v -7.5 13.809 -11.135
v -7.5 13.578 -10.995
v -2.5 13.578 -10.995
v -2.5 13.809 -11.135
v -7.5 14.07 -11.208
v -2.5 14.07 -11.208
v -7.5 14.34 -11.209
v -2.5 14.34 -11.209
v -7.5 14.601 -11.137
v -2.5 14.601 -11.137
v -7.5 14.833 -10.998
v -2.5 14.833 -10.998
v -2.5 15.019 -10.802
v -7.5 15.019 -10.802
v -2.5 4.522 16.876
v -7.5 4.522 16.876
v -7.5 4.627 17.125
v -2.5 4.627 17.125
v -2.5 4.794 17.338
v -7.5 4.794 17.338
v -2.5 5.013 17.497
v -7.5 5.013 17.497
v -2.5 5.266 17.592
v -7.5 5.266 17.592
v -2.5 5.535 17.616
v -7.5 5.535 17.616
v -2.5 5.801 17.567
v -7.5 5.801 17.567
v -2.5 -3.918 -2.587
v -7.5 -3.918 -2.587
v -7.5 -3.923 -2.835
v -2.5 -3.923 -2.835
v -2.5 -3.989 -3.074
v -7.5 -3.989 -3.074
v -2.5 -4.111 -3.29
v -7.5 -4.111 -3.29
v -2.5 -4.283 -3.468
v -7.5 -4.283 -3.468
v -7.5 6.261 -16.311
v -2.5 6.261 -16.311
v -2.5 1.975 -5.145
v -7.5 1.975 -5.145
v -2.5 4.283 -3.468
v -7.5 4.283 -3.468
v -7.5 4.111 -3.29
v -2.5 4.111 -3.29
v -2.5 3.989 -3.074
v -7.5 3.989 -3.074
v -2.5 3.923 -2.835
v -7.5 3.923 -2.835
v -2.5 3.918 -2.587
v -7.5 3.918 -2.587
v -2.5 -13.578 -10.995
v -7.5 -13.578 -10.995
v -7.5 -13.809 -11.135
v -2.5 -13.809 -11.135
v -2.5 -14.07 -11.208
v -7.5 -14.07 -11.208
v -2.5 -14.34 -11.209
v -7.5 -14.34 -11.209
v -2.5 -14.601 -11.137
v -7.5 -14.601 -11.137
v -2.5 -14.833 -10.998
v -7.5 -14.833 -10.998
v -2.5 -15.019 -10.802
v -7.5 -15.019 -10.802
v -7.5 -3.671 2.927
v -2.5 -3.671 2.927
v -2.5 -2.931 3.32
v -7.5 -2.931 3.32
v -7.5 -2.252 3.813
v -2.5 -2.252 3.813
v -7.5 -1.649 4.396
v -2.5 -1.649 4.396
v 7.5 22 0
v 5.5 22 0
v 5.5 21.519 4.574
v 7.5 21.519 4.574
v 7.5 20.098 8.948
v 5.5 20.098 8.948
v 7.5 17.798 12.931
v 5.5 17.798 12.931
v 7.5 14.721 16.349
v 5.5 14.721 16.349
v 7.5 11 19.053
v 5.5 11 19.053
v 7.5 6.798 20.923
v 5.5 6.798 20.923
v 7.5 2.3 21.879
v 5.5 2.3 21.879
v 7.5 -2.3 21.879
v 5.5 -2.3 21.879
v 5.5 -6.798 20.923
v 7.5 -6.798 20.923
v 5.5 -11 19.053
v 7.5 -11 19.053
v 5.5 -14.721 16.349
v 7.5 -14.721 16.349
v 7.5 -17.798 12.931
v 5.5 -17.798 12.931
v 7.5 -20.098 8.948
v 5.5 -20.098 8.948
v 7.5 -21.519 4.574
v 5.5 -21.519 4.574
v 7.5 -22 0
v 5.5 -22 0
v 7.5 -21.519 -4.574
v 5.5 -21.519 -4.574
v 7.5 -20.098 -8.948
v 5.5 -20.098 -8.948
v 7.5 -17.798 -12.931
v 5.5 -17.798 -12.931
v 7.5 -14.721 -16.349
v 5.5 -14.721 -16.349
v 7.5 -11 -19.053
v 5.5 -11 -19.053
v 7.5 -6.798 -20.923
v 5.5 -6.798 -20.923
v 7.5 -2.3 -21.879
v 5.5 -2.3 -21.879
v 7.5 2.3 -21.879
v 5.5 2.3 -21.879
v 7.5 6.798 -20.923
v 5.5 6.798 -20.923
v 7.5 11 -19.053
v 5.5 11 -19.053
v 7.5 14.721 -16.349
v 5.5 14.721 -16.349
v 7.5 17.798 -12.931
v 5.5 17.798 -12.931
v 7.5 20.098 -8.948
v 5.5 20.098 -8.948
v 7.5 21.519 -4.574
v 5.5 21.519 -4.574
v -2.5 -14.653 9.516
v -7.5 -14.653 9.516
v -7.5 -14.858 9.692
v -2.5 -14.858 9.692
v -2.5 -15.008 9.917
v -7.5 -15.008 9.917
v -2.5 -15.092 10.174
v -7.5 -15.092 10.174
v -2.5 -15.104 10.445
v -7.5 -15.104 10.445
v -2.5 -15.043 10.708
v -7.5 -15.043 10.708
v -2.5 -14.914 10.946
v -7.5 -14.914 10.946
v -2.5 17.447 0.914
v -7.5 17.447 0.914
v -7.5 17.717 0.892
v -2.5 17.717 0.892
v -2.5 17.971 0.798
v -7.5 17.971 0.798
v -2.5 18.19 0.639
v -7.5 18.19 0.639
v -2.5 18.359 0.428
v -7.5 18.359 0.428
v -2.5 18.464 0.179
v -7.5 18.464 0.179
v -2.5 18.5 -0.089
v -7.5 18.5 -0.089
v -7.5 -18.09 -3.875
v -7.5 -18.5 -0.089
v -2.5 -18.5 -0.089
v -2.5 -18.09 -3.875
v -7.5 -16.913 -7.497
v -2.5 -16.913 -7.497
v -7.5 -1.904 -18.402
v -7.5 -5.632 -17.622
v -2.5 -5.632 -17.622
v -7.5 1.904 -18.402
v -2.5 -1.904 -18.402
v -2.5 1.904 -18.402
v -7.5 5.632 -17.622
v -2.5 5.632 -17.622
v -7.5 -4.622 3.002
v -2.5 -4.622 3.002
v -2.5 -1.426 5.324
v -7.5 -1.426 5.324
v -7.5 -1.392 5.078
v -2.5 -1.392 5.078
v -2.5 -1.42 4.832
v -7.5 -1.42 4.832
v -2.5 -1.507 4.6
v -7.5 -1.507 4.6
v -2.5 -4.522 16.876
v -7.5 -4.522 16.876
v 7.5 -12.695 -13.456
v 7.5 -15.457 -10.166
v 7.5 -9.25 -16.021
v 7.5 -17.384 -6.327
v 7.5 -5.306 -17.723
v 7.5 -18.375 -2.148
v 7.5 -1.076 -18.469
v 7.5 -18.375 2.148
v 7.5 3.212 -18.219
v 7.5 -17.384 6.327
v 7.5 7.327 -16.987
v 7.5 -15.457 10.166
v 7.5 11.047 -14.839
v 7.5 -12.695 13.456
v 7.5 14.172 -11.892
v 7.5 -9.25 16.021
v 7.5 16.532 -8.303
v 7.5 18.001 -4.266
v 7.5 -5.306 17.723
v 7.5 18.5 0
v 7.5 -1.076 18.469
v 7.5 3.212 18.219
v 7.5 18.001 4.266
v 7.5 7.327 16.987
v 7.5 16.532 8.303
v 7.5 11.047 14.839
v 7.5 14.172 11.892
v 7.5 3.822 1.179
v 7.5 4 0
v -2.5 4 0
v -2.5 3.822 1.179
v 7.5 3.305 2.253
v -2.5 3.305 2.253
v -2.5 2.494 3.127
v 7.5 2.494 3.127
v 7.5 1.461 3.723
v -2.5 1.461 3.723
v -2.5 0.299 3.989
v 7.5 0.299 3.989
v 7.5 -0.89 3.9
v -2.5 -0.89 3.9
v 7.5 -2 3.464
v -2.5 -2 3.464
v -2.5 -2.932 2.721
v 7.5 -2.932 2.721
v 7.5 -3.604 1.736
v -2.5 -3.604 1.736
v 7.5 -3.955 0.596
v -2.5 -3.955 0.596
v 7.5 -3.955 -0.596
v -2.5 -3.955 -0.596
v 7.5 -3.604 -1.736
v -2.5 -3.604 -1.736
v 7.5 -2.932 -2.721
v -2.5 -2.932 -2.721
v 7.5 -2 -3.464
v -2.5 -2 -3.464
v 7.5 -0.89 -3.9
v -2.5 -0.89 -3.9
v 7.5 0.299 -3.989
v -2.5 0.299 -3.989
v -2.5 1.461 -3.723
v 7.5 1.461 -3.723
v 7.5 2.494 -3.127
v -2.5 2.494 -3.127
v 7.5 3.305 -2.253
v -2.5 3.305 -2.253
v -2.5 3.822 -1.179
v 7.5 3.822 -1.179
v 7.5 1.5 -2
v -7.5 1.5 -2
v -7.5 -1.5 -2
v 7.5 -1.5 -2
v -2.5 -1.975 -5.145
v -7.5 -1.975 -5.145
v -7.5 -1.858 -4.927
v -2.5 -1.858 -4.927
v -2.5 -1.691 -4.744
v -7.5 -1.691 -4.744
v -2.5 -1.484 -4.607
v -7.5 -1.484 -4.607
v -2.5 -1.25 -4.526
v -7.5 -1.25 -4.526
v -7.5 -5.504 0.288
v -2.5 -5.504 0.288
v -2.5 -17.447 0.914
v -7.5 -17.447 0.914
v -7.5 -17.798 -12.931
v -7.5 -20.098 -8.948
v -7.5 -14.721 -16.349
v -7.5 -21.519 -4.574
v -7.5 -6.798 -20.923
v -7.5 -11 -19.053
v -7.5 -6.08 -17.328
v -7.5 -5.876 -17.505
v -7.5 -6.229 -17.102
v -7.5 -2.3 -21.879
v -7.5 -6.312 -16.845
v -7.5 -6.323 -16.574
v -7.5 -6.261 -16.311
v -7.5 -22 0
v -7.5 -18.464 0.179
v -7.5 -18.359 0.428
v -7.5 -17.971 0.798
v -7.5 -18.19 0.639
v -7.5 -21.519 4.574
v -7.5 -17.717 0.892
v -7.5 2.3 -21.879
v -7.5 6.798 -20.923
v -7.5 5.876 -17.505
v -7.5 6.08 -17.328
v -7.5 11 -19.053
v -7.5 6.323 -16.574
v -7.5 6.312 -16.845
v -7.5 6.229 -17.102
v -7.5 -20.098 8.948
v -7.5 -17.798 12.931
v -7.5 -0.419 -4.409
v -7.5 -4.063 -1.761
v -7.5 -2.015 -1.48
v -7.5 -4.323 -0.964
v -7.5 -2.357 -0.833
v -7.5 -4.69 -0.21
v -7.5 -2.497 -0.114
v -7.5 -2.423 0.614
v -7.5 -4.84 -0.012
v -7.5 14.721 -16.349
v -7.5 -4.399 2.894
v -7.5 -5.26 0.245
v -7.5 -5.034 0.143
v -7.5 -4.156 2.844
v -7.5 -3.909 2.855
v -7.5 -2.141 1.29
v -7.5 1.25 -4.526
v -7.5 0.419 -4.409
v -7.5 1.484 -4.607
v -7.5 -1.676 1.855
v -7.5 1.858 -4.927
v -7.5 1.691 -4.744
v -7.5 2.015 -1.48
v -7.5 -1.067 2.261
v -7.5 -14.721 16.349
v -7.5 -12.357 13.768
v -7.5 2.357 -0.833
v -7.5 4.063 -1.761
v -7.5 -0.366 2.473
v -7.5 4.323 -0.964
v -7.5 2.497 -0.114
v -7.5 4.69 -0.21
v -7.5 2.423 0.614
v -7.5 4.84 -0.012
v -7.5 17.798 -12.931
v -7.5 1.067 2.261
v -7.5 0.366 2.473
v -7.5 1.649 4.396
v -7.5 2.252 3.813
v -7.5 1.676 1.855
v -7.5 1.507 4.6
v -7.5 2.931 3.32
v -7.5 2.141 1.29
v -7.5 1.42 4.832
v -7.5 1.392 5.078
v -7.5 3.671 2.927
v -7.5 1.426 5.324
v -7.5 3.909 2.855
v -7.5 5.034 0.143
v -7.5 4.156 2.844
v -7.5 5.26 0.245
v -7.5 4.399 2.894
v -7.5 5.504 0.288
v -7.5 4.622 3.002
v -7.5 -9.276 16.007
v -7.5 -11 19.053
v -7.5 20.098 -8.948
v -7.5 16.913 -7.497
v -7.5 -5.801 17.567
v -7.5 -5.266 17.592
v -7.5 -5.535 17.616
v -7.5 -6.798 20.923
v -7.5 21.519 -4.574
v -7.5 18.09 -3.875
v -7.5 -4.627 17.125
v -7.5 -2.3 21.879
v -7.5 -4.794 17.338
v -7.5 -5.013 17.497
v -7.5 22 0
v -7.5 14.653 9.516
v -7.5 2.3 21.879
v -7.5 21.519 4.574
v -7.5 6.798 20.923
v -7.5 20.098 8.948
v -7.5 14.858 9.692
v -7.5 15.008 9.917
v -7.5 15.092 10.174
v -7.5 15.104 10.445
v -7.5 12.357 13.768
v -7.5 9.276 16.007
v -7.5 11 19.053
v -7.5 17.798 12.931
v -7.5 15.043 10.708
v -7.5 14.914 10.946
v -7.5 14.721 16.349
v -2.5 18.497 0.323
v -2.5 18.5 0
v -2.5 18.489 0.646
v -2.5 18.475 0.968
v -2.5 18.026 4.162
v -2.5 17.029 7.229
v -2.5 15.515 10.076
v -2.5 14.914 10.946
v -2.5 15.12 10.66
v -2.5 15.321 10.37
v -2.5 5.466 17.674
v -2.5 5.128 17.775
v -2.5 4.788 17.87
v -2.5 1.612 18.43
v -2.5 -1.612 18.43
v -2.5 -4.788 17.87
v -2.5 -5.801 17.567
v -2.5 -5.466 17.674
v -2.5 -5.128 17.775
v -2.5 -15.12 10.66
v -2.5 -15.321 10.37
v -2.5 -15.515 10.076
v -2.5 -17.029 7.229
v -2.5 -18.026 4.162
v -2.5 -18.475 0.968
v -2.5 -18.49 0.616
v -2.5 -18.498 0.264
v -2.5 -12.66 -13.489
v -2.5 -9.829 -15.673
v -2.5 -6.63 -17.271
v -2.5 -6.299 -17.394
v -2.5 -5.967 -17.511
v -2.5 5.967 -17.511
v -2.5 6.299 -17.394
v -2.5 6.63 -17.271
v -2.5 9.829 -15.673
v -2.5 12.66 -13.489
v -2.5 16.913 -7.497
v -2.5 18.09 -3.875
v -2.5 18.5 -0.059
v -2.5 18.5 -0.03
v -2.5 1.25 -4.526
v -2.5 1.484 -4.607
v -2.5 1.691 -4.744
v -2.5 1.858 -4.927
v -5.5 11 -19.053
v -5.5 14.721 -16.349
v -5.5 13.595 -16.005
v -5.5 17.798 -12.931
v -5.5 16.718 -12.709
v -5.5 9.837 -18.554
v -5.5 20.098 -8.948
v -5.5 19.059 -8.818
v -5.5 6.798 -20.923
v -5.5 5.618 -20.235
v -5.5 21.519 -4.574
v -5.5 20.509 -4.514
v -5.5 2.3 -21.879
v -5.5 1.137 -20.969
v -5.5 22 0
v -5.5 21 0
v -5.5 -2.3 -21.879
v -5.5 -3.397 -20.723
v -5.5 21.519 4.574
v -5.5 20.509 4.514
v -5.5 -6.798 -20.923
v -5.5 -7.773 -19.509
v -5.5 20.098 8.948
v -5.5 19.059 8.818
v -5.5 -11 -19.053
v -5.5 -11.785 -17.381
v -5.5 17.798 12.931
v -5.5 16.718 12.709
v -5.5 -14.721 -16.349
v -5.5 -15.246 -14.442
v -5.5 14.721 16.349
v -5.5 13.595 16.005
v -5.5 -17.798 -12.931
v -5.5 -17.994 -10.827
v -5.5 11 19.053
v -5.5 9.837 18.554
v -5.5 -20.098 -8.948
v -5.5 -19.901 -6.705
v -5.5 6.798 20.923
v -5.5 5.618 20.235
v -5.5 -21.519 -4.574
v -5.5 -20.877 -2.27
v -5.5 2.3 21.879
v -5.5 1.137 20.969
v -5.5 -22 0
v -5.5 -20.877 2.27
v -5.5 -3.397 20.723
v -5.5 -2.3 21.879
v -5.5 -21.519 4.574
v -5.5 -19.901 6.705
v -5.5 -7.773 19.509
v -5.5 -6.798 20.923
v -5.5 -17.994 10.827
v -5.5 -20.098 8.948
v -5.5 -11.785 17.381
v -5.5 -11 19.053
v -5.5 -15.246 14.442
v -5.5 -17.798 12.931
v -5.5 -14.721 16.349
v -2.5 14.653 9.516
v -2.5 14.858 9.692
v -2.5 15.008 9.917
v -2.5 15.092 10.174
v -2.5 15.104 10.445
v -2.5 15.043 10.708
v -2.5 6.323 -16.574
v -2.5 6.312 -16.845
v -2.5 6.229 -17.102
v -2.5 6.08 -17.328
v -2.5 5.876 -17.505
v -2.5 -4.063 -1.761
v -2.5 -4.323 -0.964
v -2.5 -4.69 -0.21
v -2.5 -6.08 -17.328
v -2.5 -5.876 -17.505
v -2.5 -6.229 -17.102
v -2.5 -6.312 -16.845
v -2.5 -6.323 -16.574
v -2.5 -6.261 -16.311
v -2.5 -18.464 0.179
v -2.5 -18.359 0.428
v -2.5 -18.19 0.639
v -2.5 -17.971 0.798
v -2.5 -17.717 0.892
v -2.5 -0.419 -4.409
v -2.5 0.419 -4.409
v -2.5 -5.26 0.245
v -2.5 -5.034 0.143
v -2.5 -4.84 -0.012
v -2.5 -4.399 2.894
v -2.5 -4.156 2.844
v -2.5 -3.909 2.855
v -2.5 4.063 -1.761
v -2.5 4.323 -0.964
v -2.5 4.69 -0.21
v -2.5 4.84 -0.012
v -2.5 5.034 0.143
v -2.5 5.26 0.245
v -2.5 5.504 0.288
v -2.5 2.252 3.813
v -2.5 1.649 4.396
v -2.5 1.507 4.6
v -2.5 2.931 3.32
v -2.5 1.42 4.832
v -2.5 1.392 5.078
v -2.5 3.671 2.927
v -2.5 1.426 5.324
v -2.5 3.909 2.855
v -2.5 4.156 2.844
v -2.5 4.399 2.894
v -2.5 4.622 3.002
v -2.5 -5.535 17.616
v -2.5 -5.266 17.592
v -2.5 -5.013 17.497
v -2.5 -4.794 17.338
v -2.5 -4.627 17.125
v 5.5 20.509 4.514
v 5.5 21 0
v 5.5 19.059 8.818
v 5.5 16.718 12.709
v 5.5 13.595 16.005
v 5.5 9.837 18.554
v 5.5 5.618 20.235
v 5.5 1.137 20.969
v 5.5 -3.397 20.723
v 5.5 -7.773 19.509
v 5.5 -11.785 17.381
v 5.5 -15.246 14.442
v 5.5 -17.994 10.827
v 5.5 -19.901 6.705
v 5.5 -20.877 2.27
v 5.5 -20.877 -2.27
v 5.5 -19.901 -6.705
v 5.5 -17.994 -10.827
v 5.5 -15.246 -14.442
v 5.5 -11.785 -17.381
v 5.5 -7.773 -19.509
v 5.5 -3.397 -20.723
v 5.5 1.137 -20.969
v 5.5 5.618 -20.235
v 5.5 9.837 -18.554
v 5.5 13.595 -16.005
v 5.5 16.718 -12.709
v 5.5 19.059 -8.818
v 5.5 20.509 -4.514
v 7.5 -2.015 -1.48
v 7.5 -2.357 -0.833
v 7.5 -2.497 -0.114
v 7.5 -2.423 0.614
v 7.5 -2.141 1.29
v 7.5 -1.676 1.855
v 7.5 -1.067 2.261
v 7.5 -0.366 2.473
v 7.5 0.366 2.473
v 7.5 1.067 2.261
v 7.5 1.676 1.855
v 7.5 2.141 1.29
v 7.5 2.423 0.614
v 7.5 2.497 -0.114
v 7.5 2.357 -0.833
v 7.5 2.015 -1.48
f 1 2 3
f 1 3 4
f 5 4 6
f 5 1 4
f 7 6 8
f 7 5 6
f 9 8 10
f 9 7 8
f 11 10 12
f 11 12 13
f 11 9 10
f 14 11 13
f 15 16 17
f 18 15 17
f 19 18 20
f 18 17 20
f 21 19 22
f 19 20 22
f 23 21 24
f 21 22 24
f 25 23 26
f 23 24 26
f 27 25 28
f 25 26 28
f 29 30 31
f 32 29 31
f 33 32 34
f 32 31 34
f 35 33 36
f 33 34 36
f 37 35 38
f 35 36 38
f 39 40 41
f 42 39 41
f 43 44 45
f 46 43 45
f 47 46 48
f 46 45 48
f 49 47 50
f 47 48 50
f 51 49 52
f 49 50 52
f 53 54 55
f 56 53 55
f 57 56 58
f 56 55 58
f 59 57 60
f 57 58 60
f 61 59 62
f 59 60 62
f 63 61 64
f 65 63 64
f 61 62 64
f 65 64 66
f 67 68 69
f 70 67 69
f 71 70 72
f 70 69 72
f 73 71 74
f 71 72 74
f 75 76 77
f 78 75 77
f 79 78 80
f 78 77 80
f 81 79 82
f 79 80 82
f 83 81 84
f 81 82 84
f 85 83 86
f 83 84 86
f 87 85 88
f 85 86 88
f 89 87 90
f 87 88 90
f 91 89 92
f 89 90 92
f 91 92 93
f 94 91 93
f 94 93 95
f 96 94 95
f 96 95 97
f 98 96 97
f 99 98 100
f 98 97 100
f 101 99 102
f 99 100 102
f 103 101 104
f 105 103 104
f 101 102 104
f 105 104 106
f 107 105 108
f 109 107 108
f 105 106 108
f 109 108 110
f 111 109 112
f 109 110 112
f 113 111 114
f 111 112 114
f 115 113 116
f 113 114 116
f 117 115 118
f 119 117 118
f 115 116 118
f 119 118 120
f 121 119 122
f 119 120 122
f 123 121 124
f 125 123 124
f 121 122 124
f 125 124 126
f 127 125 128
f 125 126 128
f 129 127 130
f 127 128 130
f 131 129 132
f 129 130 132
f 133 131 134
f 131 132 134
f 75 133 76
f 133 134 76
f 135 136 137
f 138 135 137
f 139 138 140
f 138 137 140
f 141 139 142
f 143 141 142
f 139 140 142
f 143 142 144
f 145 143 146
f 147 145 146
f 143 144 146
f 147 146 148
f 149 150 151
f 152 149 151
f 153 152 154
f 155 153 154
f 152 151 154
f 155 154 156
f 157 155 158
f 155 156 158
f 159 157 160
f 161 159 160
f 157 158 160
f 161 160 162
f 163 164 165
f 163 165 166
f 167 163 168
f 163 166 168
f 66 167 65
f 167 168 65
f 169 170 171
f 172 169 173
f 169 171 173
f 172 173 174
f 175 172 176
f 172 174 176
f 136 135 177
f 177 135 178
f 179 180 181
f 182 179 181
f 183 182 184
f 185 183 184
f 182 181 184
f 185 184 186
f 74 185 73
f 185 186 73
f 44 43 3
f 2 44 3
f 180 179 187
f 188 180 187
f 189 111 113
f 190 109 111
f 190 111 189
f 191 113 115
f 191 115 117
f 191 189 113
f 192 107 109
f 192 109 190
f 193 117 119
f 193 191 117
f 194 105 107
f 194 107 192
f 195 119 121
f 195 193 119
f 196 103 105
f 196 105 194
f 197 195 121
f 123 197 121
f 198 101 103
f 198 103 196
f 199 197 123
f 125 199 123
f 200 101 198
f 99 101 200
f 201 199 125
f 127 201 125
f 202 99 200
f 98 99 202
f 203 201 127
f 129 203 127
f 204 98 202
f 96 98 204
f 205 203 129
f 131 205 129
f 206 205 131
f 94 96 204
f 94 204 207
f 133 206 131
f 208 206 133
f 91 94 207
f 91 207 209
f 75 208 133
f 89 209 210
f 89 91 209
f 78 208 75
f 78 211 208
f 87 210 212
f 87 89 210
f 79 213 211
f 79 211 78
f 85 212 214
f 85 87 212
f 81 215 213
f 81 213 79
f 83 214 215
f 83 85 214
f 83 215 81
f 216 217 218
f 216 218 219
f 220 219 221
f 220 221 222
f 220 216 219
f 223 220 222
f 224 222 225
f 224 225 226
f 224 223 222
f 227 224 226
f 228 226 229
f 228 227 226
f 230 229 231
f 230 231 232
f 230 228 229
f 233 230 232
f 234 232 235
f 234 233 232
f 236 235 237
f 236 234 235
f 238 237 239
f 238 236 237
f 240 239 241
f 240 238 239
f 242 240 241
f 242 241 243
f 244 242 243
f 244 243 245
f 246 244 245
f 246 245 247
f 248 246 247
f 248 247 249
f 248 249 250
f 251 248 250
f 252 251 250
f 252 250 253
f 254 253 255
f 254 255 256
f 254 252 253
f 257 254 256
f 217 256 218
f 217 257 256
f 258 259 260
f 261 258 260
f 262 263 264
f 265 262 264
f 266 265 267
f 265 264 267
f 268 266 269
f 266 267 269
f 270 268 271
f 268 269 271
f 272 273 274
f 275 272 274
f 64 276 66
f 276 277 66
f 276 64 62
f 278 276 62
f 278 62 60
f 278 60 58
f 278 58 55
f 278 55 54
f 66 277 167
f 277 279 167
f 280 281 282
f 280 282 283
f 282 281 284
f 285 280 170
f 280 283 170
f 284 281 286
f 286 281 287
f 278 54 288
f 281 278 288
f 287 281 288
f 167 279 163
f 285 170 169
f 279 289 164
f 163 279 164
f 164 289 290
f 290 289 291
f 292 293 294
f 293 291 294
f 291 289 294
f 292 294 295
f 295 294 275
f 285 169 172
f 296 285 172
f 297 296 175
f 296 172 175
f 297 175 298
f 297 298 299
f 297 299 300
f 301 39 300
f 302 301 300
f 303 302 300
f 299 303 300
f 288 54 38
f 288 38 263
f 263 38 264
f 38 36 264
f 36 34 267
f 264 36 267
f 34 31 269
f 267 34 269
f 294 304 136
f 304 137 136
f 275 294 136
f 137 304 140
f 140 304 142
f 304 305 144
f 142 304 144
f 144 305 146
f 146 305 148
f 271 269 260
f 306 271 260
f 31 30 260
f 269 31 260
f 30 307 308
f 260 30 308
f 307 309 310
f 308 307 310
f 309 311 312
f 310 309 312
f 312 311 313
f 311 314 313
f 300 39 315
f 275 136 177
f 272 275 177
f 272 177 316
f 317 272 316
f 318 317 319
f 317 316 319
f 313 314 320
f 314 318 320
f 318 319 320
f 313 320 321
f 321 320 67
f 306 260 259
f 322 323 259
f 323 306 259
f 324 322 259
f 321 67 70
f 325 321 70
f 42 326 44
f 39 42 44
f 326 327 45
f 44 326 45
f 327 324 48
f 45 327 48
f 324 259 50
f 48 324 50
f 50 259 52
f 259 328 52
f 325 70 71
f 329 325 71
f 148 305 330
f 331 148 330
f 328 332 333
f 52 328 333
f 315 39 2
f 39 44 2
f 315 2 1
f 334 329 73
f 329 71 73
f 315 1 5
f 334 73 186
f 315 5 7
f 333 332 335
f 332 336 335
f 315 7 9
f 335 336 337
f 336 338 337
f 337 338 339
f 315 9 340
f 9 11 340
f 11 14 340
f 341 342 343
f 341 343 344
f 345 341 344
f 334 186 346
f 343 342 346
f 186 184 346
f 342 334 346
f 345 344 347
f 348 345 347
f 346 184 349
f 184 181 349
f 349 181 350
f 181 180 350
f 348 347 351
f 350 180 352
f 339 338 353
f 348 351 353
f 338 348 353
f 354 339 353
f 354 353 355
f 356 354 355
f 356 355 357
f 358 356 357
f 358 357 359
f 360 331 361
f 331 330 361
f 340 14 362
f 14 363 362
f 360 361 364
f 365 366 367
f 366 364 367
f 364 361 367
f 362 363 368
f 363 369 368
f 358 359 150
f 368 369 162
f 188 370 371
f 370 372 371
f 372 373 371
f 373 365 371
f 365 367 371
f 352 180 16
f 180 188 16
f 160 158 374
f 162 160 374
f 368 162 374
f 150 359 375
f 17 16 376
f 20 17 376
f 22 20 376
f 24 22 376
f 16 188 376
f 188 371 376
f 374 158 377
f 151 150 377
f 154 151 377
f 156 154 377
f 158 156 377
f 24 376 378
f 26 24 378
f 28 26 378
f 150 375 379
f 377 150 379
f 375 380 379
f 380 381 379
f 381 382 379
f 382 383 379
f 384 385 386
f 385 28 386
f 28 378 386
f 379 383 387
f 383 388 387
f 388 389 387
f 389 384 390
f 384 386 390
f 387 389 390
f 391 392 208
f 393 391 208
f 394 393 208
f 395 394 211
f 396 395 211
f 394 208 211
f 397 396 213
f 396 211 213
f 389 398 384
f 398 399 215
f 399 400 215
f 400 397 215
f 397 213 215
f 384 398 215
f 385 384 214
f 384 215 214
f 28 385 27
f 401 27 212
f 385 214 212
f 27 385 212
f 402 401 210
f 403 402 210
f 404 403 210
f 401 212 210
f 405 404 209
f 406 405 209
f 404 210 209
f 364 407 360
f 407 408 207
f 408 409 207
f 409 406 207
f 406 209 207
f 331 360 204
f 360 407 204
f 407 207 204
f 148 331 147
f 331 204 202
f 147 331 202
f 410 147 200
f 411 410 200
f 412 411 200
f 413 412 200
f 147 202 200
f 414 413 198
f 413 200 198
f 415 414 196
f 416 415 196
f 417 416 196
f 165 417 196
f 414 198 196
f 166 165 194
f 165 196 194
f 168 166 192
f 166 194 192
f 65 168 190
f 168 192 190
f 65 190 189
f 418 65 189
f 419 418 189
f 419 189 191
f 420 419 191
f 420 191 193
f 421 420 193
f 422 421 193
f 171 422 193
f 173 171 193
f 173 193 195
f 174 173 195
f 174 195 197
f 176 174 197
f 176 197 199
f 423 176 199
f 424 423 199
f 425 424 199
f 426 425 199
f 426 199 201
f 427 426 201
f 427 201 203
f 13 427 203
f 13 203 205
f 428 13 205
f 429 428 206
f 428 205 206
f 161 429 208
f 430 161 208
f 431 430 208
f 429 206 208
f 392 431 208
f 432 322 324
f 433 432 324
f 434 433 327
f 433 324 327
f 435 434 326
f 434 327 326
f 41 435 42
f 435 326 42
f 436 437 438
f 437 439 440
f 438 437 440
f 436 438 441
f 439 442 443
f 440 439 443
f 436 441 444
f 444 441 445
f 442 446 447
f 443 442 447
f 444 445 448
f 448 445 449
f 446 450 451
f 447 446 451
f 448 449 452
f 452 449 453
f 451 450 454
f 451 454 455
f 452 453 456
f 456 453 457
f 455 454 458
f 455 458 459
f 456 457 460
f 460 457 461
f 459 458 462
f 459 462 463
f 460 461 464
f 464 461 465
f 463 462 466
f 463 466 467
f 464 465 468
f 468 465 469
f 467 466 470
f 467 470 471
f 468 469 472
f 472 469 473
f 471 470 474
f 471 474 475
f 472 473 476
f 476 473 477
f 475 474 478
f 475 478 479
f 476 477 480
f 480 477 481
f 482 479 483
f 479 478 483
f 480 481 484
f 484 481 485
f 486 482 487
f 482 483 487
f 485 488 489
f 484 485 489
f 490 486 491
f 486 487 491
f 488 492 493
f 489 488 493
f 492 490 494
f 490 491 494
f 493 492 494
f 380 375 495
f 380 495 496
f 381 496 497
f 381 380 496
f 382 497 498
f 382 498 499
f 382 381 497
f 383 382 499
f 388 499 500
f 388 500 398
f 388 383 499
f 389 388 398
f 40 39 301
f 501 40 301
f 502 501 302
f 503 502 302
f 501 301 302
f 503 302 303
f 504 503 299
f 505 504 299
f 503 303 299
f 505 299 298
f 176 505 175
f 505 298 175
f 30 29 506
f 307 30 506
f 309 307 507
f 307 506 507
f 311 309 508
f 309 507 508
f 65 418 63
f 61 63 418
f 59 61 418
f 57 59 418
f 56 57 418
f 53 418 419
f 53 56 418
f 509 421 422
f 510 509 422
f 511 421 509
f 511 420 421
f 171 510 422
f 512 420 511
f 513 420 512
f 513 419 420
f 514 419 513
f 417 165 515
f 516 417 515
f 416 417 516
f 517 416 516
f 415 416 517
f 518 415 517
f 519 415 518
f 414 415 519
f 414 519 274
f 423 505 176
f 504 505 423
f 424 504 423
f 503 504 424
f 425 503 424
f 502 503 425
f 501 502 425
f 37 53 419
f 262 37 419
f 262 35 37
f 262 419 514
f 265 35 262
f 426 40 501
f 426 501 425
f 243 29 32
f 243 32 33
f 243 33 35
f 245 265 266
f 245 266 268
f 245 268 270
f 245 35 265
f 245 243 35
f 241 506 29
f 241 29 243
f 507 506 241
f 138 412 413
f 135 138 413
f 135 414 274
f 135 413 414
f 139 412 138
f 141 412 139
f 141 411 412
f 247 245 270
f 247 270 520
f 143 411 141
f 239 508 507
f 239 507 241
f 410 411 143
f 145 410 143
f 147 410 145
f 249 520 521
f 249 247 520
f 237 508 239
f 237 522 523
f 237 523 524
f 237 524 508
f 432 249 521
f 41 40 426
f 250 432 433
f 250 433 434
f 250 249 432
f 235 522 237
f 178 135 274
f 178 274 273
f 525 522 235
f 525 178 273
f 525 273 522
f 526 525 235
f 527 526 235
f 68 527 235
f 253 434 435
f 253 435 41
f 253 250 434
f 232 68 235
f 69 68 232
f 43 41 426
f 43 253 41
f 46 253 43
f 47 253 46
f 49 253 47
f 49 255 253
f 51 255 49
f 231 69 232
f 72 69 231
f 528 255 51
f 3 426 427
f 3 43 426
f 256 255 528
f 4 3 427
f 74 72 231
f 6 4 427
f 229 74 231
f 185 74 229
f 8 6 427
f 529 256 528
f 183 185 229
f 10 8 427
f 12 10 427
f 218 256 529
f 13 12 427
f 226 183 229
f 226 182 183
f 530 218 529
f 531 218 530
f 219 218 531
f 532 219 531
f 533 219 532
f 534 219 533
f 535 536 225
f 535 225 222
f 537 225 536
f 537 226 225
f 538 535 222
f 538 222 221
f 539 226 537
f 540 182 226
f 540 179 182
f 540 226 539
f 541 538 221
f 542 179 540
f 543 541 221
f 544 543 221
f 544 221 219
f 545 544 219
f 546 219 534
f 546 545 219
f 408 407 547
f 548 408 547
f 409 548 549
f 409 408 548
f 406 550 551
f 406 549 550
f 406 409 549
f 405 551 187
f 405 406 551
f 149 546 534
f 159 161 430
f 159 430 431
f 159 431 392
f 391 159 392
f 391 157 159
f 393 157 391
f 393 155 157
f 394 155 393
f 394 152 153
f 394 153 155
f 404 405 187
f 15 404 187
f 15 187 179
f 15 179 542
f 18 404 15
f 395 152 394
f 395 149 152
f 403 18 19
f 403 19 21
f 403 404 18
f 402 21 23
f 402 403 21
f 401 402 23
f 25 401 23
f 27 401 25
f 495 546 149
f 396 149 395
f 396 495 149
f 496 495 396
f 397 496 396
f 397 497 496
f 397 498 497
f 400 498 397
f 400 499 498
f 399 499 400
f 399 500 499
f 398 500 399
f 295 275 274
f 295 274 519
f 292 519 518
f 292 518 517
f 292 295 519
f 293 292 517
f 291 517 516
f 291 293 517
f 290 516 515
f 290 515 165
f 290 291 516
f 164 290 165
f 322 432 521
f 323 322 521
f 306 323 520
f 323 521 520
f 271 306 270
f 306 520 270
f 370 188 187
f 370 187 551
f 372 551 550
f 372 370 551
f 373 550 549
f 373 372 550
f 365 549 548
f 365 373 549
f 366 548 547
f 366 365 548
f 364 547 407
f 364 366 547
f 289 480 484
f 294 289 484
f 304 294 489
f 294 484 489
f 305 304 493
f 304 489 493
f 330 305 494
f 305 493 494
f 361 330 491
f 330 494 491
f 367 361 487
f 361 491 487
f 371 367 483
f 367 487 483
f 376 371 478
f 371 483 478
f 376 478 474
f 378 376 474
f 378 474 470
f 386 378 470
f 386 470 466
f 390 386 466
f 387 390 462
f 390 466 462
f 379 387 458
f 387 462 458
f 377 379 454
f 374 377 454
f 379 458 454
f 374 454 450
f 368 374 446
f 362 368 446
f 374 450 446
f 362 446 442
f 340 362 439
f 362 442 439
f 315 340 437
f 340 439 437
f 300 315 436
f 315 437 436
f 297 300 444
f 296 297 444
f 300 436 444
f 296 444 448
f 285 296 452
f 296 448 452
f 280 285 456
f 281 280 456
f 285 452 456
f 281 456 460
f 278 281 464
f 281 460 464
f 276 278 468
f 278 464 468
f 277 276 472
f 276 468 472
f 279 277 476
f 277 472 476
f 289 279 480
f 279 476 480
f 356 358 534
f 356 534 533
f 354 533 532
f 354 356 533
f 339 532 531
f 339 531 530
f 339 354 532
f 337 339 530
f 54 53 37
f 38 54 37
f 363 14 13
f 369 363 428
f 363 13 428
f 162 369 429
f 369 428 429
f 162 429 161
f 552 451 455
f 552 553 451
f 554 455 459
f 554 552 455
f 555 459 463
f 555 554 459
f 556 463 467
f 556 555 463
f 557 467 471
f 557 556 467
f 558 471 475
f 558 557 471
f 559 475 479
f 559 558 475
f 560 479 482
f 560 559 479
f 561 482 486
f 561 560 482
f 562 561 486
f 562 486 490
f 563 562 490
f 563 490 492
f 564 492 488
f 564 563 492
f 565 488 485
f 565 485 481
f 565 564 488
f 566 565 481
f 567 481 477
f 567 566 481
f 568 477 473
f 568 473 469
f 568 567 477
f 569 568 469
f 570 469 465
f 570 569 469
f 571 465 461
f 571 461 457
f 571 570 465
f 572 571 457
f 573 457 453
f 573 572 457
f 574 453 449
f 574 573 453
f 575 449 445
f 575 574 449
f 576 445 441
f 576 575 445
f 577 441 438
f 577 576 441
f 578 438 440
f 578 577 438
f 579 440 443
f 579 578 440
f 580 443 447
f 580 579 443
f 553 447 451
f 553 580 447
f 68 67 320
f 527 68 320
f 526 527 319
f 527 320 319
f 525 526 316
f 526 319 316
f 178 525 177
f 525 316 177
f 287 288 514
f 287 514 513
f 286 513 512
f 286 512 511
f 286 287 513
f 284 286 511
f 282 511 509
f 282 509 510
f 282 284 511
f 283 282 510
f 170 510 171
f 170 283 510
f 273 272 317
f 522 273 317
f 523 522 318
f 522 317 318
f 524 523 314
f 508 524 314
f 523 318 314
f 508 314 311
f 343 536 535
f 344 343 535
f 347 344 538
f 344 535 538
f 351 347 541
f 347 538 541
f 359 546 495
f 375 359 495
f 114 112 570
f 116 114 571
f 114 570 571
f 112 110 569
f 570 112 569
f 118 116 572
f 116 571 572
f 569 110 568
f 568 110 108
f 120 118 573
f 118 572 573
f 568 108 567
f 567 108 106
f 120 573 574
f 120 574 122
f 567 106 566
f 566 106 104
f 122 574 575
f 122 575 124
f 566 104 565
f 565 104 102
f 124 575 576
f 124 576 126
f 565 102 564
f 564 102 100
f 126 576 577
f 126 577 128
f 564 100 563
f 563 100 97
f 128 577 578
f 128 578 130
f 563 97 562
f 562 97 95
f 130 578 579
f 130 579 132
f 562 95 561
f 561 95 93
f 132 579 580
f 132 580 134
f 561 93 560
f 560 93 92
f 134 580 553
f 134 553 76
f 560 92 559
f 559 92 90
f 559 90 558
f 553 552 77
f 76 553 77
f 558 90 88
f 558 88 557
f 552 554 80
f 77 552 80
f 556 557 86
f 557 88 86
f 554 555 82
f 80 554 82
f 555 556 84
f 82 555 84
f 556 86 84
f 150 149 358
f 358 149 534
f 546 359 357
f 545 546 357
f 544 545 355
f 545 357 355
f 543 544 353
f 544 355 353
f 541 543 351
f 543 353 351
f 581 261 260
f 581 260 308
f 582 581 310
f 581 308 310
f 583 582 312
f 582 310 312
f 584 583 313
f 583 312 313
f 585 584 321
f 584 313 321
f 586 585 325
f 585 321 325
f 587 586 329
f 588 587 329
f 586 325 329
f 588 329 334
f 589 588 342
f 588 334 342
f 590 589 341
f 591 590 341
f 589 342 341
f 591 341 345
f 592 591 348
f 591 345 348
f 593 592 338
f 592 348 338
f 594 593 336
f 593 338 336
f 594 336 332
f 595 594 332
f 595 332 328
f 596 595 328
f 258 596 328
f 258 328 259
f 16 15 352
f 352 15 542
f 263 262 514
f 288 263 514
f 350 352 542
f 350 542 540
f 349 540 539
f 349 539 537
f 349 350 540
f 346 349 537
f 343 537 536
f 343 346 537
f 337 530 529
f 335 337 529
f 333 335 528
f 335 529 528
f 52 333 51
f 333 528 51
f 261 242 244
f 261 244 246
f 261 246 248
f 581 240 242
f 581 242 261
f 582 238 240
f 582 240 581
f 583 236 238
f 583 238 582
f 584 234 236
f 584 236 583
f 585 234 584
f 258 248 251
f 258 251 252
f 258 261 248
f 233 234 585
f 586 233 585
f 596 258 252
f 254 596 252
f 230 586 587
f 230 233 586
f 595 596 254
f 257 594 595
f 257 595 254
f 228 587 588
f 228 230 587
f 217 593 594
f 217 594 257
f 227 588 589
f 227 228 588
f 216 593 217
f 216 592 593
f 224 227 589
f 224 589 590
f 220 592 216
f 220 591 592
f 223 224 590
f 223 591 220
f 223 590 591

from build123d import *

# Parameters (mm, degrees)
F0_R         = 21
F1_DEPTH     = 5.5
F2_R         = 22
F3_DEPTH     = 2
F4_R         = 22
F5_DEPTH     = 2
F7_DEPTH     = 15.001
F8_R         = 18.5
F8_R_2       = 4
F9_DEPTH     = 10
F11_DEPTH    = 5.001
F12_T1_DEPTH = 5


# Not quite as in the source:
# - a fillet or chamfer that OpenCascade refuses, or shapes differently, is made with other operations: its cross-section is extruded or revolved along the edge and cut away or added


with BuildPart() as f1:
    # F0 (on Right) → F1 (new body, symmetric)
    with BuildSketch(Plane.YZ):
        Circle(F0_R)
    extrude(amount=F1_DEPTH, both=True)

    # F2 (on face) → F3 (join)
    with BuildSketch(Plane.YZ.offset(5.5)):
        Circle(F2_R)
    extrude(amount=F3_DEPTH)

    # F4 (on face) → F5 (join)
    with BuildSketch(Plane(origin=(-5.5, 0, 0), x_dir=(0, -1, 0), z_dir=(-1, 0, 0))):
        Circle(F4_R)
    extrude(amount=F5_DEPTH)

    # F6 (on face) → F7 (cut, through all)
    with BuildSketch(Plane(origin=(-7.5, 0, 0), x_dir=(0, -1, 0), z_dir=(-1, 0, 0))):
        with BuildLine():
            Line((-1.5, -2), (1.5, -2))
            ThreePointArc((1.5, -2), (0, 2.5), (-1.5, -2))
        make_face()
    extrude(amount=-F7_DEPTH, mode=Mode.SUBTRACT)

    # F8 (on face) → F9 (cut)
    with BuildSketch(Plane.YZ.offset(7.5)):
        Circle(F8_R)
        Circle(F8_R_2, mode=Mode.SUBTRACT)
    extrude(amount=-F9_DEPTH, mode=Mode.SUBTRACT)

    # F10 (on face) → F11 (cut, through all)
    with BuildSketch(Plane.YZ.offset(-2.5)):
        with BuildLine():
            Line((4.7881523344, 17.8696277863), (1.2940952255, 4.8296291314))
            ThreePointArc((1.2940952255, 4.8296291314), (2.5827855501, 3.5548993357), (4.1933528397, 2.7231951751))
            Line((4.1933528397, 2.7231951751), (15.515405507, 10.0758221478))
            ThreePointArc((15.515405507, 10.0758221478), (10.8740271674, 14.9668143959), (4.7881523344, 17.8696277863))
        make_face()
        with BuildLine():
            ThreePointArc((4.9931476738, 0.2616797812), (4.1790348058, -1.3578507196), (3.8857298073, -3.1466019552))
            Line((3.8857298073, -3.1466019552), (14.377200287, -11.6424272344))
            ThreePointArc((14.377200287, -11.6424272344), (17.5945455515, -5.7168143959), (18.474646393, 0.9682151905))
            Line((18.474646393, 0.9682151905), (4.9931476738, 0.2616797812))
        make_face()
        with BuildLine():
            ThreePointArc((1.7918397477, -4.6679021325), (0, -4.3940972321), (-1.7918397477, -4.6679021325))
            Line((-1.7918397477, -4.6679021325), (-6.6298070666, -17.2712378902))
            ThreePointArc((-6.6298070666, -17.2712378902), (0, -18.5), (6.6298070666, -17.2712378902))
            Line((6.6298070666, -17.2712378902), (1.7918397477, -4.6679021325))
        make_face()
        with BuildLine():
            ThreePointArc((-3.8857298073, -3.1466019552), (-4.1790348058, -1.3578507196), (-4.9931476738, 0.2616797812))
            Line((-4.9931476738, 0.2616797812), (-18.474646393, 0.9682151905))
            ThreePointArc((-18.474646393, 0.9682151905), (-17.5945455515, -5.7168143959), (-14.377200287, -11.6424272344))
            Line((-14.377200287, -11.6424272344), (-3.8857298073, -3.1466019552))
        make_face()
        with BuildLine():
            ThreePointArc((-4.1933528397, 2.7231951751), (-2.5827855501, 3.5548993357), (-1.2940952255, 4.8296291314))
            Line((-1.2940952255, 4.8296291314), (-4.7881523344, 17.8696277863))
            ThreePointArc((-4.7881523344, 17.8696277863), (-10.8740271674, 14.9668143959), (-15.515405507, 10.0758221478))
            Line((-15.515405507, 10.0758221478), (-4.1933528397, 2.7231951751))
        make_face()
    extrude(amount=-F11_DEPTH, mode=Mode.SUBTRACT)

    # F12: fillet of radius 1 on 20 edges, made by hand

    # F12_s2 → F12_t1 (join)
    with BuildSketch(Plane.YZ.offset(-7.5)):
        with BuildLine():
            ThreePointArc((4.6223226532, 3.0017714292), (4.1563467345, 2.8435407412), (3.671320929, 2.9267301361))
            ThreePointArc((3.671320929, 2.9267301361), (3.9299597122, 2.8188656209), (4.1933528397, 2.7231951751))
            Line((4.1933528397, 2.7231951751), (4.6223226532, 3.0017714292))
        make_face()
        with BuildLine():
            ThreePointArc((1.4264780248, 5.3236884645), (1.4199861758, 4.831623059), (1.6489852086, 4.3960430429))
            ThreePointArc((1.6489852086, 4.3960430429), (1.466476179, 4.6086911748), (1.2940952255, 4.8296291314))
            Line((1.2940952255, 4.8296291314), (1.4264780248, 5.3236884645))
        make_face()
        with BuildLine():
            ThreePointArc((14.65275333, 9.5156092737), (15.0918050058, 10.1744115971), (14.9142922547, 10.9459529755))
            ThreePointArc((14.9142922547, 10.9459529755), (15.221067912, 10.5151838604), (15.515405507, 10.0758221478))
            Line((15.515405507, 10.0758221478), (14.65275333, 9.5156092737))
        make_face()
        with BuildLine():
            ThreePointArc((4.521932413, 16.8760815136), (5.0128162263, 17.4972255847), (5.8014501386, 17.5668203238))
            ThreePointArc((5.8014501386, 17.5668203238), (5.2969654732, 17.7254663345), (4.7881523344, 17.8696277863))
            Line((4.7881523344, 17.8696277863), (4.521932413, 16.8760815136))
        make_face()
        with BuildLine():
            ThreePointArc((5.5039345567, 0.2884489874), (5.0339464546, 0.1425665301), (4.6904498348, -0.2098261196))
            ThreePointArc((4.6904498348, -0.2098261196), (4.8362918345, 0.0294621688), (4.9931476738, 0.2616797812))
            Line((4.9931476738, 0.2616797812), (5.5039345567, 0.2884489874))
        make_face()
        with BuildLine():
            ThreePointArc((4.2832305314, -3.4684916949), (3.9887497267, -3.0742182326), (3.9179863263, -2.5872243429))
            ThreePointArc((3.9179863263, -2.5872243429), (3.8953248556, -2.8665364113), (3.8857298073, -3.1466019552))
            Line((3.8857298073, -3.1466019552), (4.2832305314, -3.4684916949))
        make_face()
        with BuildLine():
            ThreePointArc((1.2498722119, -4.5257227166), (1.6911638308, -4.7435120977), (1.9751406031, -5.1454171863))
            Line((1.9751406031, -5.1454171863), (1.7918397477, -4.6679021325))
            ThreePointArc((1.7918397477, -4.6679021325), (1.5225165542, -4.5904825531), (1.2498722119, -4.5257227166))
        make_face()
        with BuildLine():
            ThreePointArc((-1.9751406031, -5.1454171863), (-1.6911638308, -4.7435120977), (-1.2498722119, -4.5257227166))
            ThreePointArc((-1.2498722119, -4.5257227166), (-1.5225165542, -4.5904825531), (-1.7918397477, -4.6679021325))
            Line((-1.7918397477, -4.6679021325), (-1.9751406031, -5.1454171863))
        make_face()
        with BuildLine():
            ThreePointArc((-5.5039345567, 0.2884489874), (-5.0339464546, 0.1425665301), (-4.6904498348, -0.2098261196))
            ThreePointArc((-4.6904498348, -0.2098261196), (-4.8362918345, 0.0294621688), (-4.9931476738, 0.2616797812))
            Line((-4.9931476738, 0.2616797812), (-5.5039345567, 0.2884489874))
        make_face()
        with BuildLine():
            ThreePointArc((-3.9179863263, -2.5872243429), (-3.9887497267, -3.0742182326), (-4.2832305314, -3.4684916949))
            Line((-4.2832305314, -3.4684916949), (-3.8857298073, -3.1466019552))
            ThreePointArc((-3.8857298073, -3.1466019552), (-3.8953248556, -2.8665364113), (-3.9179863263, -2.5872243429))
        make_face()
        with BuildLine():
            ThreePointArc((-3.671320929, 2.9267301361), (-4.1563467345, 2.8435407412), (-4.6223226532, 3.0017714292))
            Line((-4.6223226532, 3.0017714292), (-4.1933528397, 2.7231951751))
            ThreePointArc((-4.1933528397, 2.7231951751), (-3.9299597122, 2.8188656209), (-3.671320929, 2.9267301361))
        make_face()
        with BuildLine():
            ThreePointArc((-1.4264780248, 5.3236884645), (-1.4199861758, 4.831623059), (-1.6489852086, 4.3960430429))
            ThreePointArc((-1.6489852086, 4.3960430429), (-1.466476179, 4.6086911748), (-1.2940952255, 4.8296291314))
            Line((-1.2940952255, 4.8296291314), (-1.4264780248, 5.3236884645))
        make_face()
        with BuildLine():
            ThreePointArc((13.5778319997, -10.9951115587), (14.3400646715, -11.2090934022), (15.0189896702, -10.8018493457))
            ThreePointArc((15.0189896702, -10.8018493457), (14.7041027879, -11.2267253108), (14.377200287, -11.6424272344))
            Line((14.377200287, -11.6424272344), (13.5778319997, -10.9951115587))
        make_face()
        with BuildLine():
            ThreePointArc((17.447461256, 0.9143826986), (18.189895813, 0.639468523), (18.4997856244, -0.0890609411))
            ThreePointArc((18.4997856244, -0.0890609411), (18.4947726116, 0.4397568007), (18.474646393, 0.9682151905))
            Line((18.474646393, 0.9682151905), (17.447461256, 0.9143826986))
        make_face()
        with BuildLine():
            ThreePointArc((6.2611916607, -16.3109619271), (6.229157638, -17.1020123027), (5.6320461618, -17.6218630125))
            ThreePointArc((5.6320461618, -17.6218630125), (6.133432615, -17.4536816849), (6.6298070666, -17.2712378902))
            Line((6.6298070666, -17.2712378902), (6.2611916607, -16.3109619271))
        make_face()
        with BuildLine():
            ThreePointArc((-6.2611916607, -16.3109619271), (-6.229157638, -17.1020123027), (-5.6320461618, -17.6218630125))
            ThreePointArc((-5.6320461618, -17.6218630125), (-6.133432615, -17.4536816849), (-6.6298070666, -17.2712378902))
            Line((-6.6298070666, -17.2712378902), (-6.2611916607, -16.3109619271))
        make_face()
        with BuildLine():
            ThreePointArc((-17.447461256, 0.9143826986), (-18.189895813, 0.639468523), (-18.4997856244, -0.0890609411))
            ThreePointArc((-18.4997856244, -0.0890609411), (-18.4947726116, 0.4397568007), (-18.474646393, 0.9682151905))
            Line((-18.474646393, 0.9682151905), (-17.447461256, 0.9143826986))
        make_face()
        with BuildLine():
            ThreePointArc((-13.5778319997, -10.9951115587), (-14.3400646715, -11.2090934022), (-15.0189896702, -10.8018493457))
            ThreePointArc((-15.0189896702, -10.8018493457), (-14.7041027879, -11.2267253108), (-14.377200287, -11.6424272344))
            Line((-14.377200287, -11.6424272344), (-13.5778319997, -10.9951115587))
        make_face()
        with BuildLine():
            ThreePointArc((-4.521932413, 16.8760815136), (-5.0128162263, 17.4972255847), (-5.8014501386, 17.5668203238))
            ThreePointArc((-5.8014501386, 17.5668203238), (-5.2969654732, 17.7254663345), (-4.7881523344, 17.8696277863))
            Line((-4.7881523344, 17.8696277863), (-4.521932413, 16.8760815136))
        make_face()
        with BuildLine():
            ThreePointArc((-14.65275333, 9.5156092737), (-15.0918050058, 10.1744115971), (-14.9142922547, 10.9459529755))
            ThreePointArc((-14.9142922547, 10.9459529755), (-15.221067912, 10.5151838604), (-15.515405507, 10.0758221478))
            Line((-15.515405507, 10.0758221478), (-14.65275333, 9.5156092737))
        make_face()
    extrude(amount=F12_T1_DEPTH)


solid = f1.part
